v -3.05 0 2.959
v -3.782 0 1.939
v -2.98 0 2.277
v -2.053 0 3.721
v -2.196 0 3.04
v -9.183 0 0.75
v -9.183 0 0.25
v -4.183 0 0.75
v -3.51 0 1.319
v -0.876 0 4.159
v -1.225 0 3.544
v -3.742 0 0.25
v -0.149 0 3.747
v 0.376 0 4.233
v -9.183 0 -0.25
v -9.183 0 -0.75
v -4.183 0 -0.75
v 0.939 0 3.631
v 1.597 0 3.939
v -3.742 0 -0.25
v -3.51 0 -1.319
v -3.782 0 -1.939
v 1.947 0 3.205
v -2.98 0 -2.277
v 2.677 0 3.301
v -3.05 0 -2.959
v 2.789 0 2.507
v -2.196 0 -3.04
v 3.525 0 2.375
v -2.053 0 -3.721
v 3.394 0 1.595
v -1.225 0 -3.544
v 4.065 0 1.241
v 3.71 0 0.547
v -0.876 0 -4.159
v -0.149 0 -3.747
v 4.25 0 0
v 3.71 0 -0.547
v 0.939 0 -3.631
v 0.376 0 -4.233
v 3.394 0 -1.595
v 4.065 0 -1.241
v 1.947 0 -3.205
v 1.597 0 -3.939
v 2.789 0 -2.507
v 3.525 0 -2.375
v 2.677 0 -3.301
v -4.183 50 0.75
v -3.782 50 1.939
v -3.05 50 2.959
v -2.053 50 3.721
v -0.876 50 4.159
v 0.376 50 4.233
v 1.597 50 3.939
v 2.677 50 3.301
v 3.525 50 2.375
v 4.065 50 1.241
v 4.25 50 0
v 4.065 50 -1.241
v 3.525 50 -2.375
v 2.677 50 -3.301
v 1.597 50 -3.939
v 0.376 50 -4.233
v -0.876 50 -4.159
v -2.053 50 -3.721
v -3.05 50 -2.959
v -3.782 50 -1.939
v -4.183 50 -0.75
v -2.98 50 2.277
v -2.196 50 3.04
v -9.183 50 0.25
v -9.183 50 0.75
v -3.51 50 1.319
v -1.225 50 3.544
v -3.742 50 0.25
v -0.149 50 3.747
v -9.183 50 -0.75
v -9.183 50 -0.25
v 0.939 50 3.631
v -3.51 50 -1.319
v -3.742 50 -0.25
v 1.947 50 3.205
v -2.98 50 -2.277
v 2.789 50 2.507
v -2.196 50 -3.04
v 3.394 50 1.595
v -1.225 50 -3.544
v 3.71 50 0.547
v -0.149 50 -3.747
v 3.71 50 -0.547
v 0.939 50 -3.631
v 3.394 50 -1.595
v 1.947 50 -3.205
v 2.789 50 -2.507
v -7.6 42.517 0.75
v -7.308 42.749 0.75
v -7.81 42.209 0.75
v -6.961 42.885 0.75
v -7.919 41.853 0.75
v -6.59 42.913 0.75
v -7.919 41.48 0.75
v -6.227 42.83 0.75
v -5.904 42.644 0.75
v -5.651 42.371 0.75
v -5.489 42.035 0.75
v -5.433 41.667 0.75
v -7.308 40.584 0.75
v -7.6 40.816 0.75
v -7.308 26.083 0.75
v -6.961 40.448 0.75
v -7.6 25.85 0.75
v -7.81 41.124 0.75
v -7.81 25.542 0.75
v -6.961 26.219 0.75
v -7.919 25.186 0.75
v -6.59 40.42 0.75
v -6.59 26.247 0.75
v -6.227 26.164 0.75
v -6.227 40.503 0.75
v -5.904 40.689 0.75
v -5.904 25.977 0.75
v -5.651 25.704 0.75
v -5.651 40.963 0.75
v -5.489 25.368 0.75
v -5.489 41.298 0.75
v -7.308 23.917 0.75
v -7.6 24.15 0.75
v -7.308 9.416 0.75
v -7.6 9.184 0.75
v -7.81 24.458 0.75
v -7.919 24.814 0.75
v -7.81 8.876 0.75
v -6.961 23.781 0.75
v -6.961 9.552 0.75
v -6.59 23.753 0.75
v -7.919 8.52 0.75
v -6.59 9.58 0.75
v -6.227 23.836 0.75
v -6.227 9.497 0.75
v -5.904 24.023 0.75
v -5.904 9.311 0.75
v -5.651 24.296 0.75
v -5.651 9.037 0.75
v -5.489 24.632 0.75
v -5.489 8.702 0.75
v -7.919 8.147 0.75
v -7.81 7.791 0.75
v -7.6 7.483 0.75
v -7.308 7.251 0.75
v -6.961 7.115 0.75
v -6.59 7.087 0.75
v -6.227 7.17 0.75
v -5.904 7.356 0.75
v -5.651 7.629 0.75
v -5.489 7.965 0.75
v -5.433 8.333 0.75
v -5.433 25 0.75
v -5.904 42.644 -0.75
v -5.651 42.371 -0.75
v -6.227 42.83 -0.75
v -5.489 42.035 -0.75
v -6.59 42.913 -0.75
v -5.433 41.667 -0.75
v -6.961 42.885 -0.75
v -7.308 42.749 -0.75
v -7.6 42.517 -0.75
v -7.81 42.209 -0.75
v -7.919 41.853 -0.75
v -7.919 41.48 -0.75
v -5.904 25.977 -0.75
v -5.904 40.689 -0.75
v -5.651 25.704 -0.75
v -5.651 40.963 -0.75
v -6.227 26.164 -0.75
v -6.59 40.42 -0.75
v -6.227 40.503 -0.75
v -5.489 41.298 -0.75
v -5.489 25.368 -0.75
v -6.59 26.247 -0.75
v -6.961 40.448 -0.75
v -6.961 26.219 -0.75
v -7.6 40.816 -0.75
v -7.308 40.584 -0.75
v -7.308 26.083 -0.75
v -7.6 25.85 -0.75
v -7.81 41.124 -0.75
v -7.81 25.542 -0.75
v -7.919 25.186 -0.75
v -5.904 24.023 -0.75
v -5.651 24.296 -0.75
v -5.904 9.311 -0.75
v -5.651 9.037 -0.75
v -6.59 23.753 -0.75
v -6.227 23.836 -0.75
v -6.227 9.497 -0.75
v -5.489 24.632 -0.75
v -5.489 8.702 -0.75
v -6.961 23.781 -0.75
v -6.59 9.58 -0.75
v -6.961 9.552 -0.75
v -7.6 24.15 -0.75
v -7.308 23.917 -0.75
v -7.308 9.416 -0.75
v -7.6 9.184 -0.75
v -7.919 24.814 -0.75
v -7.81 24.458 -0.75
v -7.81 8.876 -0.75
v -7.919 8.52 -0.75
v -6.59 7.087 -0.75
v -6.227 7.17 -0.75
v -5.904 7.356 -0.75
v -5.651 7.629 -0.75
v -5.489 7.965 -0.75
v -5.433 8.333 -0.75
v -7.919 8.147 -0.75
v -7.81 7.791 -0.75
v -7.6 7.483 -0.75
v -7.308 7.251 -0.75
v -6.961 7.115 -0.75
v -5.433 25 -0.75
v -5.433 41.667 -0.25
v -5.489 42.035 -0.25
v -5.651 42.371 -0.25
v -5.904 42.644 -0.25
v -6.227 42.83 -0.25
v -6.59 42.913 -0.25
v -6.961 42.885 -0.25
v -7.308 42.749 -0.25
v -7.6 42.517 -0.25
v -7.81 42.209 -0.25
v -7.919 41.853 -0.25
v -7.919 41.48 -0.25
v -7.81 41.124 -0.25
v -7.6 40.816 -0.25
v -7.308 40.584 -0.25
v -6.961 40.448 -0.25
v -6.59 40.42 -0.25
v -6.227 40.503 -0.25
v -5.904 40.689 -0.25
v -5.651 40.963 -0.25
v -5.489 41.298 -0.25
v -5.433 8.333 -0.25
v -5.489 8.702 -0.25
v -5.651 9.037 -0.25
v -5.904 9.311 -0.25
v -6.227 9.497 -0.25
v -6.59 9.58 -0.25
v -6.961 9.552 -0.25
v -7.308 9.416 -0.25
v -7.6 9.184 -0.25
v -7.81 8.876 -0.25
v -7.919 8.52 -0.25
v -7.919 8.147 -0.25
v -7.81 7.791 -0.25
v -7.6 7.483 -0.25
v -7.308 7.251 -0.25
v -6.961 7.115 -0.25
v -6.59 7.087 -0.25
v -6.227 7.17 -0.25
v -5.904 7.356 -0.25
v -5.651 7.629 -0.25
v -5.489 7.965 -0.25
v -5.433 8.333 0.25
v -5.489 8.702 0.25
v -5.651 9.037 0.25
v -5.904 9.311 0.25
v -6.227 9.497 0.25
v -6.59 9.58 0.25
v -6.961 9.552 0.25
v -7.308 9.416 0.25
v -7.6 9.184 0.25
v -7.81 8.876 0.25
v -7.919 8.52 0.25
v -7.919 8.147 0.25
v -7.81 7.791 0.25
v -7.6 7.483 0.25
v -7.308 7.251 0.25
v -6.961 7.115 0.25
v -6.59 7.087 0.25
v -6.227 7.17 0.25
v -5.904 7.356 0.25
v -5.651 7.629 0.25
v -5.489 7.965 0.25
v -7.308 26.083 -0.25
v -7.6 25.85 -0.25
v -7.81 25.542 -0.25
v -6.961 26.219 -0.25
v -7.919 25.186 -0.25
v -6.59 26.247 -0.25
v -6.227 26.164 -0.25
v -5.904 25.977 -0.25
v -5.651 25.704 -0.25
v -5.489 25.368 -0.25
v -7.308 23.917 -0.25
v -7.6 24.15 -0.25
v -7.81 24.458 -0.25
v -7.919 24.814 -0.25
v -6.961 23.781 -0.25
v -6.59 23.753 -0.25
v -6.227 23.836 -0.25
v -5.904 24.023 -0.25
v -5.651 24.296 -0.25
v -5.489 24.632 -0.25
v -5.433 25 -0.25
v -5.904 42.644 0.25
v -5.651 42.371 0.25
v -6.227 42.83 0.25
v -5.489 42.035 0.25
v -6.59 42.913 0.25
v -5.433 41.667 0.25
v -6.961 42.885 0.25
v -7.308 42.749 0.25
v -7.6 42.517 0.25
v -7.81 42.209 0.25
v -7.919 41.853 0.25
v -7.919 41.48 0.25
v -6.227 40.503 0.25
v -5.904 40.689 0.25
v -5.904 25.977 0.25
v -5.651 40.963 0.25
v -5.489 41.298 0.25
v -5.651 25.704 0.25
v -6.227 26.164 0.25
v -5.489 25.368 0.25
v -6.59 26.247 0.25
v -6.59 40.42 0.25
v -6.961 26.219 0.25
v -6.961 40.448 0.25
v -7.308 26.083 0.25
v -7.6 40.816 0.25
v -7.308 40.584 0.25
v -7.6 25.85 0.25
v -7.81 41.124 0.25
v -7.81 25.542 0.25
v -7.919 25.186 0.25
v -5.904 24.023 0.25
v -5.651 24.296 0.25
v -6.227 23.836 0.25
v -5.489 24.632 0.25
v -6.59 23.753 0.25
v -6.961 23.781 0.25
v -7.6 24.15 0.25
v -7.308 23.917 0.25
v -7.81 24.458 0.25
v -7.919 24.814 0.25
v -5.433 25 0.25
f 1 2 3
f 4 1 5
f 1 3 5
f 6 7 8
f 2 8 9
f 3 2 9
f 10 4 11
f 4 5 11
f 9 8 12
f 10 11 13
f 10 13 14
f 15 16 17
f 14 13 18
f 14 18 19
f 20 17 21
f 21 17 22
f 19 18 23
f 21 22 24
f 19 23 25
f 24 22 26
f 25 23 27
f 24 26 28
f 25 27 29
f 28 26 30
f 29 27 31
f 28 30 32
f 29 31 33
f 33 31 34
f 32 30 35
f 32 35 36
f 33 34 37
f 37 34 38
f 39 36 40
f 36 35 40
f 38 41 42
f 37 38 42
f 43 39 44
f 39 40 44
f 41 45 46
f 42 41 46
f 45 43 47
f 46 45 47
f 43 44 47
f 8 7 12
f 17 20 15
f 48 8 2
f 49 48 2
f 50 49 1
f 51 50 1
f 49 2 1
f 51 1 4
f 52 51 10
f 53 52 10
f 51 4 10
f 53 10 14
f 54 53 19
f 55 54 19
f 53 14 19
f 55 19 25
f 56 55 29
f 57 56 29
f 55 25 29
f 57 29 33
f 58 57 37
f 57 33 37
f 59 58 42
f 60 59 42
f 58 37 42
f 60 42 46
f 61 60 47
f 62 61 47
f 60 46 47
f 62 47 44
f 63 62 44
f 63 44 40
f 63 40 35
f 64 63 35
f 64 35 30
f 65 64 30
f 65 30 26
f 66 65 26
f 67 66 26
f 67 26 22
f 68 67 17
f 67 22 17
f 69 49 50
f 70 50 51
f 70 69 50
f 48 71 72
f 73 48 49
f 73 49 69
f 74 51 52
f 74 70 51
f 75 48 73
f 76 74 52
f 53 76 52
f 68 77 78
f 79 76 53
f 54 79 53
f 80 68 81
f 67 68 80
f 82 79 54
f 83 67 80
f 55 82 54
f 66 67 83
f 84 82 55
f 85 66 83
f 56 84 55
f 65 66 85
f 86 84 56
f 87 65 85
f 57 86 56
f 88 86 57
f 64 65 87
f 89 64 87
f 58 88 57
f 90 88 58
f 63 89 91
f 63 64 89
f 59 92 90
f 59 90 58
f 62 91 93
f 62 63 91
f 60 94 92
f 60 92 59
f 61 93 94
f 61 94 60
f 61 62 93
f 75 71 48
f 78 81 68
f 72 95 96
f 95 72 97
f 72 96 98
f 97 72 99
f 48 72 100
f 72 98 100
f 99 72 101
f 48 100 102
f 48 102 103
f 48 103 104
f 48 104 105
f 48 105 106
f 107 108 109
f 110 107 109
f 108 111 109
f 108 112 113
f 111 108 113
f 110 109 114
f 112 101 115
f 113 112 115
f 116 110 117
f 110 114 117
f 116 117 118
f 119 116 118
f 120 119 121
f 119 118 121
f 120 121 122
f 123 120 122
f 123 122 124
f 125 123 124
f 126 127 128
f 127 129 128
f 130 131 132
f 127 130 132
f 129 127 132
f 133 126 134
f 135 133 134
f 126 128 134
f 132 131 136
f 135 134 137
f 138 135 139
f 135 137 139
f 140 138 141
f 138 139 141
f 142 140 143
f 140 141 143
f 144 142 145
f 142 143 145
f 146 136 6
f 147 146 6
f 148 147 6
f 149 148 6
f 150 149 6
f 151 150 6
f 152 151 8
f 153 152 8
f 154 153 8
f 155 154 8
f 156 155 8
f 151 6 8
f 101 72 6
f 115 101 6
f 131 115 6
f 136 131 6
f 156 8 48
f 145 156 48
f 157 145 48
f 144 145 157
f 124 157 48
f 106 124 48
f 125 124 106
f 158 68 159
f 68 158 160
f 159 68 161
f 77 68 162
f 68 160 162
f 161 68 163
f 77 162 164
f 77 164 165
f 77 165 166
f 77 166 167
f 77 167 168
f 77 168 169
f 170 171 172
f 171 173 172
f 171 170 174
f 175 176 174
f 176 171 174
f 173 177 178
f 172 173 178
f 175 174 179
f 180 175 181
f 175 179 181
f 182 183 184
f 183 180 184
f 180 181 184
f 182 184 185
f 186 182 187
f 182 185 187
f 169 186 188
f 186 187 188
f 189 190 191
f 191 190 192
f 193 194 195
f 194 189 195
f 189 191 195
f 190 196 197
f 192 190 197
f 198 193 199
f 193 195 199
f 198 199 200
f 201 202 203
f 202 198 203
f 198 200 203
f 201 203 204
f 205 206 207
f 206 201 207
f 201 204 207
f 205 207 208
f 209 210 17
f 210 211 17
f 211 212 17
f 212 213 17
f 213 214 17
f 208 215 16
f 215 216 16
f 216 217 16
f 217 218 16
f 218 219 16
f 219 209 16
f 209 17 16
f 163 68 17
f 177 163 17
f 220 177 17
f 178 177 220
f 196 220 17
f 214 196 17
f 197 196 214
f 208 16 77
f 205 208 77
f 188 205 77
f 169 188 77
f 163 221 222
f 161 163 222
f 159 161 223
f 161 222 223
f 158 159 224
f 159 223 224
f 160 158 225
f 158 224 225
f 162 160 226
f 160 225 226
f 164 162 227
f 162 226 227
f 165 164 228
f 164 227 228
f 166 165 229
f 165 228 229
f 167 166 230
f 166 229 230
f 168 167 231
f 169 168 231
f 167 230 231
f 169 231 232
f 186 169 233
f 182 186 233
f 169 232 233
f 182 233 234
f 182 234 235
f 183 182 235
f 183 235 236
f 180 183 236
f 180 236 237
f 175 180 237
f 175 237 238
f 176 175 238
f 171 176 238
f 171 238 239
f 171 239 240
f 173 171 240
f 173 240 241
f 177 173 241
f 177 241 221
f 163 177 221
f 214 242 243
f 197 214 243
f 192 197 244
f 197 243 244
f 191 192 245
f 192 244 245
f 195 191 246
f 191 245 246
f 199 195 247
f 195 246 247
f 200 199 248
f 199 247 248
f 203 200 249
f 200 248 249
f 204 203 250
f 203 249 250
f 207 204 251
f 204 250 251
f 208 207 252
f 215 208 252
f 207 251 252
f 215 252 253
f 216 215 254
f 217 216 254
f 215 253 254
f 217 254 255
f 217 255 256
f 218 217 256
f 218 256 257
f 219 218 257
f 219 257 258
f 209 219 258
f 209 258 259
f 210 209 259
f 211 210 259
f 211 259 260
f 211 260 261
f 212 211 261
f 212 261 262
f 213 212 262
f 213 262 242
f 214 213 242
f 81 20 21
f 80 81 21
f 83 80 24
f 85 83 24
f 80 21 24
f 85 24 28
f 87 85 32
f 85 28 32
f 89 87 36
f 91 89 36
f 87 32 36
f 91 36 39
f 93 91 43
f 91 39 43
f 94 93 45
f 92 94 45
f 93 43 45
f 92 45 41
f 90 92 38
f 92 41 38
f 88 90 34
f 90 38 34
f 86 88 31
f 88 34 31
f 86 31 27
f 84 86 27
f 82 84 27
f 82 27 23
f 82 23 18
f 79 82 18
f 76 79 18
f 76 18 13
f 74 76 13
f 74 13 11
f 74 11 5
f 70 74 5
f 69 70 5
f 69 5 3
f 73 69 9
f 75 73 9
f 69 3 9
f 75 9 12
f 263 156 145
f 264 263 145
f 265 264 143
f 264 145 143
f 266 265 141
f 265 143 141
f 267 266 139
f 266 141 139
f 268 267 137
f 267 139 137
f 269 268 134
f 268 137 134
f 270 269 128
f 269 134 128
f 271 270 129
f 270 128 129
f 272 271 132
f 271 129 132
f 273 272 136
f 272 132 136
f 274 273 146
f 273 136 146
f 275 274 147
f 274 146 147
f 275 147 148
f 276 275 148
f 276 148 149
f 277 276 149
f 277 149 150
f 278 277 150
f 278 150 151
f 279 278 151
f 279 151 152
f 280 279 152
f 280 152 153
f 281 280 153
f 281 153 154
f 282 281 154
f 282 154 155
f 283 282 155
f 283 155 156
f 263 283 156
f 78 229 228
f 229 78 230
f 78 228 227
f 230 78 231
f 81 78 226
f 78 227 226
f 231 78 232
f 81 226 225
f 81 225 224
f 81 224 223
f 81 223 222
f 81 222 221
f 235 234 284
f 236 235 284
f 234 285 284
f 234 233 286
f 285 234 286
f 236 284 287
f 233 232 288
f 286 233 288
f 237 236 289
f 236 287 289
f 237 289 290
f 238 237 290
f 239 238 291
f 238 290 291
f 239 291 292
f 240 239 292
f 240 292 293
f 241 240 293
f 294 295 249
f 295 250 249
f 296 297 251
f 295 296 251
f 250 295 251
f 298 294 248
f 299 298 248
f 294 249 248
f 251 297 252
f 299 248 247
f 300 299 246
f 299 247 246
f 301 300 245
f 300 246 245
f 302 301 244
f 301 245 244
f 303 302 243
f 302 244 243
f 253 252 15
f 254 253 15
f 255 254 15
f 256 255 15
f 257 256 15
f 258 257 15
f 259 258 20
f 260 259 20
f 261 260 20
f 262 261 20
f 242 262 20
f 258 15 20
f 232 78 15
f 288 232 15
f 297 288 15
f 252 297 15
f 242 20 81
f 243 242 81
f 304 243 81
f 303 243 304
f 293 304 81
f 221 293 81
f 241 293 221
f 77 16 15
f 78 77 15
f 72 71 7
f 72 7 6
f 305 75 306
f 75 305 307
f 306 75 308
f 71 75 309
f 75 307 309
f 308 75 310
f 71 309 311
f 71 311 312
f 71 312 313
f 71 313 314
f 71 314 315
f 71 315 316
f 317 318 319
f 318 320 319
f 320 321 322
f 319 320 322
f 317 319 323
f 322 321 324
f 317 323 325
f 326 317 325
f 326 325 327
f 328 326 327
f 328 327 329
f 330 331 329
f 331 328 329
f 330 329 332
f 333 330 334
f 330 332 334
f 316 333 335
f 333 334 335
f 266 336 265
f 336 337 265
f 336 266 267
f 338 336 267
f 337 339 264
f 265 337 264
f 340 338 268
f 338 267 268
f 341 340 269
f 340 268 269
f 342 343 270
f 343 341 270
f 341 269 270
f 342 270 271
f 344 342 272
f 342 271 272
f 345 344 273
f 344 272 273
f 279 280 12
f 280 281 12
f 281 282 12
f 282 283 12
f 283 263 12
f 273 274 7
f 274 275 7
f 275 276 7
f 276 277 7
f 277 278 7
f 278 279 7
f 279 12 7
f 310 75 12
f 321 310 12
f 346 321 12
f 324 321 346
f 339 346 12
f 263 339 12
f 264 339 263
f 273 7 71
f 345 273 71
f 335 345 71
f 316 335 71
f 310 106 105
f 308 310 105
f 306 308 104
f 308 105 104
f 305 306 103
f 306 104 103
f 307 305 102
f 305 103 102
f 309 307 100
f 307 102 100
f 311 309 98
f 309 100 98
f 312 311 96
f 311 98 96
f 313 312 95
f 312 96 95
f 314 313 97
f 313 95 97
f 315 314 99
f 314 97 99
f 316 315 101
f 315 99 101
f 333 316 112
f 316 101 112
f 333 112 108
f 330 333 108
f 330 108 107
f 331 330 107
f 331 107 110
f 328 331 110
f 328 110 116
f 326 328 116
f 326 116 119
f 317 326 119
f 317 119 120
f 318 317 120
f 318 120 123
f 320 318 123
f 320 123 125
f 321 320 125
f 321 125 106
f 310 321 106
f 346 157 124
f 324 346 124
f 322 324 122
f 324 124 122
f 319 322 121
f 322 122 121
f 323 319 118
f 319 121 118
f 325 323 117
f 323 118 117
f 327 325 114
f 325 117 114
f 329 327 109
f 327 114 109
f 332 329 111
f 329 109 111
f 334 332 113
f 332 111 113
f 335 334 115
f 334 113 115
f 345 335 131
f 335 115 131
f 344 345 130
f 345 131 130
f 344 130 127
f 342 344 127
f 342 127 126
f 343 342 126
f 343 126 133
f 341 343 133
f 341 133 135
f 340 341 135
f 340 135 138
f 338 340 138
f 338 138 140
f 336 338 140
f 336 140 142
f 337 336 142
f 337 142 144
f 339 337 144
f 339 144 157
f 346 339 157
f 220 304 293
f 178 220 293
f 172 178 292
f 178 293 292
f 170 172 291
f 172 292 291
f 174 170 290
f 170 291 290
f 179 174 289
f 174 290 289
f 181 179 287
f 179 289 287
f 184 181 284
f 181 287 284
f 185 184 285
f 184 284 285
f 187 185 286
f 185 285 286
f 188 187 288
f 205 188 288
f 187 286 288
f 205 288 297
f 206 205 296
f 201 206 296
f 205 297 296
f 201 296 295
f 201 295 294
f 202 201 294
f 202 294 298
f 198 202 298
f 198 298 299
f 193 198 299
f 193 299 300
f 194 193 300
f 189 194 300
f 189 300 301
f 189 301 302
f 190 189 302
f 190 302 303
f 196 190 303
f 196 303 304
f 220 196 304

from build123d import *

# Parameters (mm, degrees)
AUFSATZ_LINEAR_AUSTRAGEN1_DEPTH = 50
SKIZZE2_R                       = 1.25
SCHNITT_LINEAR_AUSTRAGEN1_DEPTH = 52.081630762


with BuildPart() as part:
    # Skizze1 → Aufsatz-Linear austragen1 (new body)
    with BuildSketch(Plane(origin=(0, 0, 0), x_dir=(1, 0, 0), z_dir=(0, 1, 0))):
        with BuildLine():
            Line((-4.183300133, 0.25), (-3.741657387, 0.25))
            ThreePointArc((-3.741657387, 0.25), (3.75, 0), (-3.741657387, -0.25))
            Line((-3.741657387, -0.25), (-4.183300133, -0.25))
            Line((-4.183300133, -0.25), (-9.183300133, -0.25))
            Line((-9.183300133, -0.25), (-9.183300133, -0.75))
            Line((-9.183300133, -0.75), (-4.183300133, -0.75))
            ThreePointArc((-4.183300133, -0.75), (4.25, 0), (-4.183300133, 0.75))
            Line((-4.183300133, 0.75), (-9.183300133, 0.75))
            Line((-9.183300133, 0.75), (-9.183300133, 0.25))
            Line((-9.183300133, 0.25), (-4.183300133, 0.25))
        make_face()
    extrude(amount=AUFSATZ_LINEAR_AUSTRAGEN1_DEPTH)

    # Skizze2 → Schnitt-Linear austragen1 (cut, through all)
    with BuildSketch(Plane.XY.offset(0.75)):
        with Locations((-6.683300133, 41.666666667)):
            Circle(SKIZZE2_R)
        with Locations((-6.683300133, 25)):
            Circle(SKIZZE2_R)
        with Locations((-6.683300133, 8.333333333)):
            Circle(SKIZZE2_R)
    extrude(amount=-SCHNITT_LINEAR_AUSTRAGEN1_DEPTH, mode=Mode.SUBTRACT)


solid = part.part
